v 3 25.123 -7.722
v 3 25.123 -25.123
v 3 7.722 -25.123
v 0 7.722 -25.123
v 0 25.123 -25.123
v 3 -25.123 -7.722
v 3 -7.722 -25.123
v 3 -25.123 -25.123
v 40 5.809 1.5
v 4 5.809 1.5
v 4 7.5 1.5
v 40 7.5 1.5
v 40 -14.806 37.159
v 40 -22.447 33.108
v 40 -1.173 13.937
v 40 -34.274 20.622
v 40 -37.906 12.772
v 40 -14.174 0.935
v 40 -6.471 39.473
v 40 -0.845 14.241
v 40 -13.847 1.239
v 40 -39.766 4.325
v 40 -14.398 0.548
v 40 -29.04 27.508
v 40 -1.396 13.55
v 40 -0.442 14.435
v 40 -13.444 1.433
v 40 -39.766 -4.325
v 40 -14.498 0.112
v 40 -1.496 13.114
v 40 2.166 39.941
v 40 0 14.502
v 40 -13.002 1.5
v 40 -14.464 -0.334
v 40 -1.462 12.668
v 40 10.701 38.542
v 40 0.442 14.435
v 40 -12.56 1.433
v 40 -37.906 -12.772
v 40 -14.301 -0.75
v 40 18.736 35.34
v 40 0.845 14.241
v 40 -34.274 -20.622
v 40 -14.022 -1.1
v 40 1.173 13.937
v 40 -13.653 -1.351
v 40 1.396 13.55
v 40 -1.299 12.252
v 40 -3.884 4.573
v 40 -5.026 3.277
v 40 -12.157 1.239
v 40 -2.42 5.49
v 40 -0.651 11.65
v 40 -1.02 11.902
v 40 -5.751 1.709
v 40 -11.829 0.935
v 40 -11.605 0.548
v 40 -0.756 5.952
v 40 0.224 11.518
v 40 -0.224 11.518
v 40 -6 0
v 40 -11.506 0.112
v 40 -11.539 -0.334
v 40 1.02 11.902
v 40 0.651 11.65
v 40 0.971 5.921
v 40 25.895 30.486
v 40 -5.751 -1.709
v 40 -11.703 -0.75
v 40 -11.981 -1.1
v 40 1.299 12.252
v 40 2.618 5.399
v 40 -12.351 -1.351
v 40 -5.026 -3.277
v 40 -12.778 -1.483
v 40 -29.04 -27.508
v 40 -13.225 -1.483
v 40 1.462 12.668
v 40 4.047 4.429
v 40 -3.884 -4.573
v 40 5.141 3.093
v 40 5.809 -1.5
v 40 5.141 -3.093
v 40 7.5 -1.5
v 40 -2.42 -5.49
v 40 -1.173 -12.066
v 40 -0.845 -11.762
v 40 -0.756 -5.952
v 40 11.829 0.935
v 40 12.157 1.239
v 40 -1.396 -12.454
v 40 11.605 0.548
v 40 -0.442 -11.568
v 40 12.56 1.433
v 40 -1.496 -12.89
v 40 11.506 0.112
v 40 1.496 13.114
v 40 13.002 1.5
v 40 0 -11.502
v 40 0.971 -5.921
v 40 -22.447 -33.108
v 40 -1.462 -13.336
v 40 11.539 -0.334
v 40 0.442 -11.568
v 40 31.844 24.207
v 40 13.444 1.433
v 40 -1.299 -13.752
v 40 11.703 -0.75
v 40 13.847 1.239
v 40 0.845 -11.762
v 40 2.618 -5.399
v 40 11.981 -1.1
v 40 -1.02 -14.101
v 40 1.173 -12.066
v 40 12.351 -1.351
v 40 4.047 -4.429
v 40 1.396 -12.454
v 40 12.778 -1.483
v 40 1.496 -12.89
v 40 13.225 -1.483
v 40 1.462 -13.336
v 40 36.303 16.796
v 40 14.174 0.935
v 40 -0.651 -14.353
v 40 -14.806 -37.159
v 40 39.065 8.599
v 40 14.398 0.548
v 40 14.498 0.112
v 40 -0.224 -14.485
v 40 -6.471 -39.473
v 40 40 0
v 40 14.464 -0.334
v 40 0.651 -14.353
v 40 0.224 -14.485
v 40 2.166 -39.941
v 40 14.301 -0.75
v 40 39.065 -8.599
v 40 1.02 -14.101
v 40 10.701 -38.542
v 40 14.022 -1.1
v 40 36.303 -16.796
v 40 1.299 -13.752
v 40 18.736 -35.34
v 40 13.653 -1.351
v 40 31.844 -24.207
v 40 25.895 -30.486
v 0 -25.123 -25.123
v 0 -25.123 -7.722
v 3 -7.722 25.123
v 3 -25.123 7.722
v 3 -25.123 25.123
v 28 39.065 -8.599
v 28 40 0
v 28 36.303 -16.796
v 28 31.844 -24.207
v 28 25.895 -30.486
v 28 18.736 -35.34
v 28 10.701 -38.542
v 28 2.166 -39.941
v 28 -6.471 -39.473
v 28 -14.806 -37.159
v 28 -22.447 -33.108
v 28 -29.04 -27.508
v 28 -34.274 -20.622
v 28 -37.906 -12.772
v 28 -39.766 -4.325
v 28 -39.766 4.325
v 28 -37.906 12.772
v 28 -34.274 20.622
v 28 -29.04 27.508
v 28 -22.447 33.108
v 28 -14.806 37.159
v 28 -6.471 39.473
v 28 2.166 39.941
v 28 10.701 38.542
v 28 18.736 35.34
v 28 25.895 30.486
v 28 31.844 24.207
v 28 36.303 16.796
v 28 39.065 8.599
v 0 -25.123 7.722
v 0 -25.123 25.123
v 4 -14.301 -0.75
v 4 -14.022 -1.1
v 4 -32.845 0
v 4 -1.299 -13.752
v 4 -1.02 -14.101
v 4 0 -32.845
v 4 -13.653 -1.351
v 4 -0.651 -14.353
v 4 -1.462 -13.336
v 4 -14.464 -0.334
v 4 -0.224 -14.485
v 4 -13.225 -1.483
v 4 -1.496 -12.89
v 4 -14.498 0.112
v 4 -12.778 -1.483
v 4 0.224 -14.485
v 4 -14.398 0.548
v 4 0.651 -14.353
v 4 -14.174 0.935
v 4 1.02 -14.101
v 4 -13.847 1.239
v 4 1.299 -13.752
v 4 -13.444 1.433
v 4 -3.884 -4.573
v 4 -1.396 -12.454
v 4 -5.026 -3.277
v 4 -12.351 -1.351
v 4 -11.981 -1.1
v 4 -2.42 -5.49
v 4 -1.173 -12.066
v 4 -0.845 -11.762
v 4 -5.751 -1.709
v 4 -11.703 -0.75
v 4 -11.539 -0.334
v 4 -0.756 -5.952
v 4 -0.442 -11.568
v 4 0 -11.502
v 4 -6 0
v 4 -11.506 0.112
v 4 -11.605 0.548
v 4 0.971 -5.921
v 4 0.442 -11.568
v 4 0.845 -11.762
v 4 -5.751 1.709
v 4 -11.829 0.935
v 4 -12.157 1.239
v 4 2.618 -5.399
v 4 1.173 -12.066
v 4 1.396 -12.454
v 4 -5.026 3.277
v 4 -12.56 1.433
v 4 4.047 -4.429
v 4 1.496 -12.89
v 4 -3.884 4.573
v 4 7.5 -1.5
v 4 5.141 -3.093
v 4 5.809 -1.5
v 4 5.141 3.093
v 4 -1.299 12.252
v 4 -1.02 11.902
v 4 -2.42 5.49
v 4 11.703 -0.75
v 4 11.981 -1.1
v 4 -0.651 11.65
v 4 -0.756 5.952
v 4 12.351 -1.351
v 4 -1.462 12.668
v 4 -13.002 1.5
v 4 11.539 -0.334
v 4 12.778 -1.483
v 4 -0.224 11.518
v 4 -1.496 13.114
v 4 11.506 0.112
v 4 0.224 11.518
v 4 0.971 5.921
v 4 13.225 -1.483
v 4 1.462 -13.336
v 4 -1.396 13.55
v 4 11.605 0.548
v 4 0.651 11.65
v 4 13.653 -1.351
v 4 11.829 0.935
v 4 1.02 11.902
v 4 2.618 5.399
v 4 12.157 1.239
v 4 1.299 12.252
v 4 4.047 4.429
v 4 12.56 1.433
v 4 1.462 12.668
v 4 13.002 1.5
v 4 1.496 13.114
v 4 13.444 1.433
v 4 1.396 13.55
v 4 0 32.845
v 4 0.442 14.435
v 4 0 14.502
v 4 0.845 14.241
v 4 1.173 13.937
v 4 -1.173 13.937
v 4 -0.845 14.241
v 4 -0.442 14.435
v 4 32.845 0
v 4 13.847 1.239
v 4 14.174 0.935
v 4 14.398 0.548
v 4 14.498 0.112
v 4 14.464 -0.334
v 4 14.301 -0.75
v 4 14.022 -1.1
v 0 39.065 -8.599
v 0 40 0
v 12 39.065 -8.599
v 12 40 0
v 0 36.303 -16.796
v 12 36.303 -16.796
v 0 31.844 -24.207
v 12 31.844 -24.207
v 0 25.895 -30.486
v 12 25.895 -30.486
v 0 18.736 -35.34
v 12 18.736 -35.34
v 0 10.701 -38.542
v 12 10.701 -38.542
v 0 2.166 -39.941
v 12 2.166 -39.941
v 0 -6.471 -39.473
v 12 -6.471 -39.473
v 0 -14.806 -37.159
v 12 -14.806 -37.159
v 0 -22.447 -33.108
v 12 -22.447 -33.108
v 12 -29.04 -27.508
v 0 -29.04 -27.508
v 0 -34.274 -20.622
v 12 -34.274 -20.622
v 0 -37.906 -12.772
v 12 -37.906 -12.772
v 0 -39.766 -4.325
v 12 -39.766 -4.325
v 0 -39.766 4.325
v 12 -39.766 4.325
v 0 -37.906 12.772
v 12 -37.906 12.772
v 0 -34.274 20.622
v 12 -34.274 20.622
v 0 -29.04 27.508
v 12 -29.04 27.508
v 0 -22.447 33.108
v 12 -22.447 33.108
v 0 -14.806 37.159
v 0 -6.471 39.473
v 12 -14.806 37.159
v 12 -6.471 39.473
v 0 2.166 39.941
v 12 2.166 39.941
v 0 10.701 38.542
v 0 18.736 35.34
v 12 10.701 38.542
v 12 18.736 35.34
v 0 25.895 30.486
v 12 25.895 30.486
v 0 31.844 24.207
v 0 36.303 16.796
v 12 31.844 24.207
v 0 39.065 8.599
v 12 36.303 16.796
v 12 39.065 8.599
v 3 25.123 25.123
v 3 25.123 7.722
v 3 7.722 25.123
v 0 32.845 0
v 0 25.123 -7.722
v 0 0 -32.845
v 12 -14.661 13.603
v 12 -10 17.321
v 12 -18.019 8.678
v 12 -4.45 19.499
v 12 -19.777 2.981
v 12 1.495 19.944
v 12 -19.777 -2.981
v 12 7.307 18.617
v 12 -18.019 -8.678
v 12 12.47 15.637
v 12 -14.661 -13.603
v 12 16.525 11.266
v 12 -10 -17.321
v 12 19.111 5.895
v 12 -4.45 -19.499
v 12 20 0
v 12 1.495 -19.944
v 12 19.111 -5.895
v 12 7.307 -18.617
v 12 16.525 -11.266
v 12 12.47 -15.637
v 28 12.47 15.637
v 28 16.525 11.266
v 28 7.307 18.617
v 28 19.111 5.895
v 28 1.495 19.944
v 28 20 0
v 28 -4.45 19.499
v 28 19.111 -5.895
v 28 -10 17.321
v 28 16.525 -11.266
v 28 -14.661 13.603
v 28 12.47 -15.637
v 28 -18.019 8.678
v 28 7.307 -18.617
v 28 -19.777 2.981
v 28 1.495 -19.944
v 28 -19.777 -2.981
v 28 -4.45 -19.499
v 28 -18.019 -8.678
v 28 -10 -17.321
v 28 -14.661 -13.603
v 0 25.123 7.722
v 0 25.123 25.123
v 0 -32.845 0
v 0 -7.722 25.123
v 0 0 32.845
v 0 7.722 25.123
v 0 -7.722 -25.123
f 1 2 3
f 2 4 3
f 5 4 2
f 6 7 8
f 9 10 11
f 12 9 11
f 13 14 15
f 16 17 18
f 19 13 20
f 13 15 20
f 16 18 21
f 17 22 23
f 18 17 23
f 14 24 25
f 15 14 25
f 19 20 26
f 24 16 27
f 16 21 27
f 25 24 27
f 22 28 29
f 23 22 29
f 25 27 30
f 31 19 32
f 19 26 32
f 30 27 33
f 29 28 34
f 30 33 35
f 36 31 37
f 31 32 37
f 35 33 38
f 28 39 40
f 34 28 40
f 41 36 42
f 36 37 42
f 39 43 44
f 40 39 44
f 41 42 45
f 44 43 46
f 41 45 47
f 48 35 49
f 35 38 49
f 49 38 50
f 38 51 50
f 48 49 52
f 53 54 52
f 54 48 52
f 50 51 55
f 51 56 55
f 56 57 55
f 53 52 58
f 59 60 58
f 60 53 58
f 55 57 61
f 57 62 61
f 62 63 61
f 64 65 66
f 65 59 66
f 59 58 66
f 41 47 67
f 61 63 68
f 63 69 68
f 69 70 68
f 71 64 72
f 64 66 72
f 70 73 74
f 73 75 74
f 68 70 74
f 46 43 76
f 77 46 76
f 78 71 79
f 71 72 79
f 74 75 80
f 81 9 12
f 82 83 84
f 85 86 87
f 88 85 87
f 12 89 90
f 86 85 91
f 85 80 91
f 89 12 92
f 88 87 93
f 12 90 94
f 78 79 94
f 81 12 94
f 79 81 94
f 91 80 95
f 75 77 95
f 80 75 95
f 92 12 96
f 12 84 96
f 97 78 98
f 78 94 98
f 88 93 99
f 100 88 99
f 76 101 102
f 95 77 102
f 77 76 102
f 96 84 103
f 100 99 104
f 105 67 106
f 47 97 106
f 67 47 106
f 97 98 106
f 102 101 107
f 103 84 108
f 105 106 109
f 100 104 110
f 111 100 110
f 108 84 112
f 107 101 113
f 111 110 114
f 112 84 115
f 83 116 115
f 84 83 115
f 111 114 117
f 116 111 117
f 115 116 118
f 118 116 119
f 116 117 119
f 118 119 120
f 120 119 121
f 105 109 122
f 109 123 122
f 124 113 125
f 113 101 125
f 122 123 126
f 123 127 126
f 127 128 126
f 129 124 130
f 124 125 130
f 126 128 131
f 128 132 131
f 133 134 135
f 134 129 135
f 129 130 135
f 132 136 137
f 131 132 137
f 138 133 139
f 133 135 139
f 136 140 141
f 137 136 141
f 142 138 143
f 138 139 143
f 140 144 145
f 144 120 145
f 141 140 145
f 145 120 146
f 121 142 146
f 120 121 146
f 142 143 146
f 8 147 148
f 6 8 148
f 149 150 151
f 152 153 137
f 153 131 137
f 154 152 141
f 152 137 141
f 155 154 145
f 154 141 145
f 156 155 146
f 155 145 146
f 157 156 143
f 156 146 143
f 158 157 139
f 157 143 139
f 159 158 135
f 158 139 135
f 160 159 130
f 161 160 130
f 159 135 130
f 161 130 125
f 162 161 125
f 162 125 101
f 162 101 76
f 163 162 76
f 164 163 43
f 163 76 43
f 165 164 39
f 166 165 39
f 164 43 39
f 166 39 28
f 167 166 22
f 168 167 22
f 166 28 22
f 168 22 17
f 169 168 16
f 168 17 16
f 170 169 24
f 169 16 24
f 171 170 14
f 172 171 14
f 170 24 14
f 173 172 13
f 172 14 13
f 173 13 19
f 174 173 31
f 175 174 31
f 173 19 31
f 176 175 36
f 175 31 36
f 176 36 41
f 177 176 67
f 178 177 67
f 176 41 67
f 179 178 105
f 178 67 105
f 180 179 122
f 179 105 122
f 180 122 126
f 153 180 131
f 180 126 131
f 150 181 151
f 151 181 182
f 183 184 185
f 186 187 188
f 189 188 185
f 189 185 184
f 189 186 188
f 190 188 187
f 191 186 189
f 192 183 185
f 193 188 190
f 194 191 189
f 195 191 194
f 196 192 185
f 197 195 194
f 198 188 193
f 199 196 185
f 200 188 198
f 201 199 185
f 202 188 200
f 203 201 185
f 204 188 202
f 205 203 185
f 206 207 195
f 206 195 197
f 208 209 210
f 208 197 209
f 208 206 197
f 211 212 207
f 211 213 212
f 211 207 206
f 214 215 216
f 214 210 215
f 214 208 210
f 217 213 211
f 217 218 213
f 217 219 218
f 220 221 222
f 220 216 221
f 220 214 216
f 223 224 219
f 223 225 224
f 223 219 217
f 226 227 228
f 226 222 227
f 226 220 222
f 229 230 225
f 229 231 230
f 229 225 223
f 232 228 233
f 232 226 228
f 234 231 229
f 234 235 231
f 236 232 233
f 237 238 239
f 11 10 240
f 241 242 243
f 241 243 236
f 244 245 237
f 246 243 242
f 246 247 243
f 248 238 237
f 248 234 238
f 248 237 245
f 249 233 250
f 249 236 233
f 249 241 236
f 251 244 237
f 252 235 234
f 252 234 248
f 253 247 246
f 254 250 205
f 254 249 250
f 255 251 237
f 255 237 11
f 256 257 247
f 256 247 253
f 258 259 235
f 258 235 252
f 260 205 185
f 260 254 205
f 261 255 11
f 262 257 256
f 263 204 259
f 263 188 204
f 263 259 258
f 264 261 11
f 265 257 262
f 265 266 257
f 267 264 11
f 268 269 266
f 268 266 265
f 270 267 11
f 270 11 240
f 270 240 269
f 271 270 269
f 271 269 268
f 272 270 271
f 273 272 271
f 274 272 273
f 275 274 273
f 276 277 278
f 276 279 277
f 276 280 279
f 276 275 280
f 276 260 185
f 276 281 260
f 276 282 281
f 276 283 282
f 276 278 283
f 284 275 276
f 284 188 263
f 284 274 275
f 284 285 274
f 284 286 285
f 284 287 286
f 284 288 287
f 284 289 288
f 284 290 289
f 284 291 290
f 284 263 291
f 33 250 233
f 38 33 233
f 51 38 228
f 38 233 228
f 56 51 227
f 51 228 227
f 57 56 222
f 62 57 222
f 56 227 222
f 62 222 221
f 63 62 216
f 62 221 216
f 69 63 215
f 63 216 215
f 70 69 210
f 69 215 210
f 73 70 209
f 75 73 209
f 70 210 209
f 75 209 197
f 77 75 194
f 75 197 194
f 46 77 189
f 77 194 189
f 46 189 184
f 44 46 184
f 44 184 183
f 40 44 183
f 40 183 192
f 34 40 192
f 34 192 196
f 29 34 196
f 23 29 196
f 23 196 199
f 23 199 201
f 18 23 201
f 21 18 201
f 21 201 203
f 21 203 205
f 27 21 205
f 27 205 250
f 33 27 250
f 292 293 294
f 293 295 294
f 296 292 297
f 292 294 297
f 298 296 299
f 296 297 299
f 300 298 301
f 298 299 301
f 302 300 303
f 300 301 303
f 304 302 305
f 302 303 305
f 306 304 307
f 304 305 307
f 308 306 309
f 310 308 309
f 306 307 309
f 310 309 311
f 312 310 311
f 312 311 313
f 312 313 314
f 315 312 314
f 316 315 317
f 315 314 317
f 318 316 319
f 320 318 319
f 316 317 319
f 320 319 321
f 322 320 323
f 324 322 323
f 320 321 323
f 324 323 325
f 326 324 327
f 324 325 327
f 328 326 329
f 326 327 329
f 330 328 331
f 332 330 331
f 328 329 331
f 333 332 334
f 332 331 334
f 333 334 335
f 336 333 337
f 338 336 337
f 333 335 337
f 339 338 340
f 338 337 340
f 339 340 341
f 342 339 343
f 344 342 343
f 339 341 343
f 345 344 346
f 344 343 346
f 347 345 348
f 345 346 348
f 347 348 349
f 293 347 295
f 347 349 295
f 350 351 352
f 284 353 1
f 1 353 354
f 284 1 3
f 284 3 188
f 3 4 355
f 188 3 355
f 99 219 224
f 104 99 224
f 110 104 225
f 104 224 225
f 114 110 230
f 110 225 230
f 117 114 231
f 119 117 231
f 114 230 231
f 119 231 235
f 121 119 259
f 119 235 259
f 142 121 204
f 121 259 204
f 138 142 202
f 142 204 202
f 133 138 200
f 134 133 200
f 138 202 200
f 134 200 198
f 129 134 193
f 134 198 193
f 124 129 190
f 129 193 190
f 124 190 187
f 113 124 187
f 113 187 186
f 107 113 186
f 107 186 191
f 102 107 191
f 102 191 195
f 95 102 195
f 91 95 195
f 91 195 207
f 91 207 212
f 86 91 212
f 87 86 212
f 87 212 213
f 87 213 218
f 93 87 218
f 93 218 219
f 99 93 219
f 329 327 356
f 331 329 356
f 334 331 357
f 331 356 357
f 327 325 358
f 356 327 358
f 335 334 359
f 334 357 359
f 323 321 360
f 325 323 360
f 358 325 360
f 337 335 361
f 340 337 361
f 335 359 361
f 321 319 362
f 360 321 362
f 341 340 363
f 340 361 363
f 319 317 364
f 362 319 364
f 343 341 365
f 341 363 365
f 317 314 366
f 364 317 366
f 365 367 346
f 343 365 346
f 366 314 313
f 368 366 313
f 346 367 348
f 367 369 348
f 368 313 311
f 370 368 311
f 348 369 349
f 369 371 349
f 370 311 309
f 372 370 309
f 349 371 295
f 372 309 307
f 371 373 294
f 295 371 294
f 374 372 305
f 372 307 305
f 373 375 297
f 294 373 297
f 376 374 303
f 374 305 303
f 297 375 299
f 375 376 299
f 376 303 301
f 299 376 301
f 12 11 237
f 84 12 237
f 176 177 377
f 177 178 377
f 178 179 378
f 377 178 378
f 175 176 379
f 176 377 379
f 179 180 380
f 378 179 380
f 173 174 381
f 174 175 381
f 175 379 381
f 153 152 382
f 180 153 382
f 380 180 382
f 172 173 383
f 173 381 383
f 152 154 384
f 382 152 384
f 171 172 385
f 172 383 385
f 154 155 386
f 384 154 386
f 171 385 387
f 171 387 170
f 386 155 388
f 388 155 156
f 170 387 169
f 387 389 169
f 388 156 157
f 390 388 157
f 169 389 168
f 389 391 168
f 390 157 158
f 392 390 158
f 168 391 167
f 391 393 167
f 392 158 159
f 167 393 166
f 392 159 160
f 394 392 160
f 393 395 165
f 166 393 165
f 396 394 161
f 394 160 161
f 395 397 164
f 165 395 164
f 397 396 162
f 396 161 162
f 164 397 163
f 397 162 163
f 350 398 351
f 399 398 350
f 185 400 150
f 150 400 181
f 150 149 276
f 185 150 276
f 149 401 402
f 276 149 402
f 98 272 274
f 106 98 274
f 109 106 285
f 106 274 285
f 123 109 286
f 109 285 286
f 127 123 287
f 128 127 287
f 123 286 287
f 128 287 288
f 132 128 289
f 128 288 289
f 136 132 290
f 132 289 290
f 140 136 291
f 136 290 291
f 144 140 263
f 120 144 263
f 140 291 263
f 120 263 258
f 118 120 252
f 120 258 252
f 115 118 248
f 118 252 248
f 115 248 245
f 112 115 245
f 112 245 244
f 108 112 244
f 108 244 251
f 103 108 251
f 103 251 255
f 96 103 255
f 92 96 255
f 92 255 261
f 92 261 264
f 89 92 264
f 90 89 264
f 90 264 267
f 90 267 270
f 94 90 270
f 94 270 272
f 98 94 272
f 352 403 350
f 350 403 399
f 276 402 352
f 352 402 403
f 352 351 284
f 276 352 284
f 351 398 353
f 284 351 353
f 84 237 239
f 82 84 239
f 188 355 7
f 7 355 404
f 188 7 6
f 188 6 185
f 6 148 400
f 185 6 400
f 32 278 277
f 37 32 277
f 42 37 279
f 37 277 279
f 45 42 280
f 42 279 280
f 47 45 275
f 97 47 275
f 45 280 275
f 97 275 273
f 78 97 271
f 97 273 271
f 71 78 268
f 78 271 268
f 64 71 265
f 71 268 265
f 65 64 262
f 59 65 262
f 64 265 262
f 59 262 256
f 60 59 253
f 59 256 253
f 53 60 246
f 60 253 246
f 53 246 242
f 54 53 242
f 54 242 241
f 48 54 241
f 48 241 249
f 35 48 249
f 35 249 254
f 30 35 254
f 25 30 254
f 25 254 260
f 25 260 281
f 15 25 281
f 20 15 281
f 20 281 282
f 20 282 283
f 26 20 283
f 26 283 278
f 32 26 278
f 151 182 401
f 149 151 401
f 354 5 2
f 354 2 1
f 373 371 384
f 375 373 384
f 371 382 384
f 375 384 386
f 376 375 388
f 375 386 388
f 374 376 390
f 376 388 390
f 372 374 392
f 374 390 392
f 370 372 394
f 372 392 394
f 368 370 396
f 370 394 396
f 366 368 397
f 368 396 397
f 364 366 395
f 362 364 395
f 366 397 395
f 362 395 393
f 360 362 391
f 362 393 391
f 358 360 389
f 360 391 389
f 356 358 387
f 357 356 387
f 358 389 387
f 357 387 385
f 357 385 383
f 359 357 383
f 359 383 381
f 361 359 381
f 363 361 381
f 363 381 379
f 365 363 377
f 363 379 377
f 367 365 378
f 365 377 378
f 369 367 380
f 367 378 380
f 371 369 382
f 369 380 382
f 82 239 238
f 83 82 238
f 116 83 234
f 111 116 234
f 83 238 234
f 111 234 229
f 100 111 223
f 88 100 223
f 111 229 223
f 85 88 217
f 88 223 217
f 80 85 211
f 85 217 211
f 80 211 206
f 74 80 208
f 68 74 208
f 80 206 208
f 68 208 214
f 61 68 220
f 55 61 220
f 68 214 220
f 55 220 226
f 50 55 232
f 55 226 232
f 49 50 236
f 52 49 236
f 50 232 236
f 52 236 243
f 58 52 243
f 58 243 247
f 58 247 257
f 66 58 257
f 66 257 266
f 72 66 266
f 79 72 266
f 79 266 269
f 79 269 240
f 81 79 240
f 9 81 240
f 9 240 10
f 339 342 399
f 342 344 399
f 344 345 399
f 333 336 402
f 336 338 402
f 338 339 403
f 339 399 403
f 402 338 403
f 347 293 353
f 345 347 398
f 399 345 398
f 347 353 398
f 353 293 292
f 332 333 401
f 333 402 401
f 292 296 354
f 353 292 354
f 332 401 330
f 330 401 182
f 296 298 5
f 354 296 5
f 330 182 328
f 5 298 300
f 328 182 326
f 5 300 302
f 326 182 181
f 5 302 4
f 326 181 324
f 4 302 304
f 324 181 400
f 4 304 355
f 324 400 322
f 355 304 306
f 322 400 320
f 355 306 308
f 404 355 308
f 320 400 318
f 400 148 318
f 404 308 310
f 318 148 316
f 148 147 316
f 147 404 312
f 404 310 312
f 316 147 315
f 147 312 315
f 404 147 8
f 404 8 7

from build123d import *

# Parameters (mm, degrees)
ESBO_O6_R             = 6
CORTE_EXTRUS_O3_DEPTH = 41
ESBO_O7_R             = 1.5
CORTE_EXTRUS_O4_DEPTH = 41
CORTE_EXTRUS_O6_DEPTH = 4
ESBO_O10_W            = 50.246941072
ESBO_O10_H            = 50.246941072
CORTE_EXTRUS_O7_DEPTH = 3


with BuildPart() as part:
    # Esboço5 → Revolução1 (revolve)
    with BuildSketch(Plane.XY):
        Polygon((0, 0), (0, 40), (12, 40), (12, 20), (28, 20), (28, 40), (40, 40), (40, 0), align=None)
    revolve(axis=Axis((40, 0, 0), (-1, 0, 0)))

    # Esboço6 → Corte-extrusão3 (cut, through all)
    with BuildSketch(Plane.ZY):
        Circle(ESBO_O6_R)
        with BuildLine():
            Line((0, 7.5), (-1.5, 7.5))
            Line((-1.5, 7.5), (-1.5, 5.809475019))
            ThreePointArc((-1.5, 5.809475019), (0, 6), (1.5, 5.809475019))
            Line((1.5, 5.809475019), (1.5, 7.5))
            Line((1.5, 7.5), (0, 7.5))
        make_face()
    extrude(amount=-CORTE_EXTRUS_O3_DEPTH, mode=Mode.SUBTRACT)

    # Esboço7 → Corte-extrusão4 (cut, through all)
    with BuildSketch(Plane.ZY):
        with Locations((0, 13.001726509)):
            Circle(ESBO_O7_R)
        with Locations((13.001726509, 0)):
            Circle(ESBO_O7_R)
        with Locations((0, -13.001726509)):
            Circle(ESBO_O7_R)
        with Locations((-13.001726509, 0)):
            Circle(ESBO_O7_R)
    extrude(amount=-CORTE_EXTRUS_O4_DEPTH, mode=Mode.SUBTRACT)

    # Esboço9 → Corte-extrusão6 (cut)
    with BuildSketch(Plane.ZY):
        Polygon((0, -32.845160811), (32.845160811, 0), (0, 32.845160811), (-32.845160811, 0), align=None)
    extrude(amount=-CORTE_EXTRUS_O6_DEPTH, mode=Mode.SUBTRACT)

    # Esboço10 → Corte-extrusão7 (cut)
    with BuildSketch(Plane.ZY):
        Rectangle(ESBO_O10_W, ESBO_O10_H)
    extrude(amount=-CORTE_EXTRUS_O7_DEPTH, mode=Mode.SUBTRACT)


solid = part.part
